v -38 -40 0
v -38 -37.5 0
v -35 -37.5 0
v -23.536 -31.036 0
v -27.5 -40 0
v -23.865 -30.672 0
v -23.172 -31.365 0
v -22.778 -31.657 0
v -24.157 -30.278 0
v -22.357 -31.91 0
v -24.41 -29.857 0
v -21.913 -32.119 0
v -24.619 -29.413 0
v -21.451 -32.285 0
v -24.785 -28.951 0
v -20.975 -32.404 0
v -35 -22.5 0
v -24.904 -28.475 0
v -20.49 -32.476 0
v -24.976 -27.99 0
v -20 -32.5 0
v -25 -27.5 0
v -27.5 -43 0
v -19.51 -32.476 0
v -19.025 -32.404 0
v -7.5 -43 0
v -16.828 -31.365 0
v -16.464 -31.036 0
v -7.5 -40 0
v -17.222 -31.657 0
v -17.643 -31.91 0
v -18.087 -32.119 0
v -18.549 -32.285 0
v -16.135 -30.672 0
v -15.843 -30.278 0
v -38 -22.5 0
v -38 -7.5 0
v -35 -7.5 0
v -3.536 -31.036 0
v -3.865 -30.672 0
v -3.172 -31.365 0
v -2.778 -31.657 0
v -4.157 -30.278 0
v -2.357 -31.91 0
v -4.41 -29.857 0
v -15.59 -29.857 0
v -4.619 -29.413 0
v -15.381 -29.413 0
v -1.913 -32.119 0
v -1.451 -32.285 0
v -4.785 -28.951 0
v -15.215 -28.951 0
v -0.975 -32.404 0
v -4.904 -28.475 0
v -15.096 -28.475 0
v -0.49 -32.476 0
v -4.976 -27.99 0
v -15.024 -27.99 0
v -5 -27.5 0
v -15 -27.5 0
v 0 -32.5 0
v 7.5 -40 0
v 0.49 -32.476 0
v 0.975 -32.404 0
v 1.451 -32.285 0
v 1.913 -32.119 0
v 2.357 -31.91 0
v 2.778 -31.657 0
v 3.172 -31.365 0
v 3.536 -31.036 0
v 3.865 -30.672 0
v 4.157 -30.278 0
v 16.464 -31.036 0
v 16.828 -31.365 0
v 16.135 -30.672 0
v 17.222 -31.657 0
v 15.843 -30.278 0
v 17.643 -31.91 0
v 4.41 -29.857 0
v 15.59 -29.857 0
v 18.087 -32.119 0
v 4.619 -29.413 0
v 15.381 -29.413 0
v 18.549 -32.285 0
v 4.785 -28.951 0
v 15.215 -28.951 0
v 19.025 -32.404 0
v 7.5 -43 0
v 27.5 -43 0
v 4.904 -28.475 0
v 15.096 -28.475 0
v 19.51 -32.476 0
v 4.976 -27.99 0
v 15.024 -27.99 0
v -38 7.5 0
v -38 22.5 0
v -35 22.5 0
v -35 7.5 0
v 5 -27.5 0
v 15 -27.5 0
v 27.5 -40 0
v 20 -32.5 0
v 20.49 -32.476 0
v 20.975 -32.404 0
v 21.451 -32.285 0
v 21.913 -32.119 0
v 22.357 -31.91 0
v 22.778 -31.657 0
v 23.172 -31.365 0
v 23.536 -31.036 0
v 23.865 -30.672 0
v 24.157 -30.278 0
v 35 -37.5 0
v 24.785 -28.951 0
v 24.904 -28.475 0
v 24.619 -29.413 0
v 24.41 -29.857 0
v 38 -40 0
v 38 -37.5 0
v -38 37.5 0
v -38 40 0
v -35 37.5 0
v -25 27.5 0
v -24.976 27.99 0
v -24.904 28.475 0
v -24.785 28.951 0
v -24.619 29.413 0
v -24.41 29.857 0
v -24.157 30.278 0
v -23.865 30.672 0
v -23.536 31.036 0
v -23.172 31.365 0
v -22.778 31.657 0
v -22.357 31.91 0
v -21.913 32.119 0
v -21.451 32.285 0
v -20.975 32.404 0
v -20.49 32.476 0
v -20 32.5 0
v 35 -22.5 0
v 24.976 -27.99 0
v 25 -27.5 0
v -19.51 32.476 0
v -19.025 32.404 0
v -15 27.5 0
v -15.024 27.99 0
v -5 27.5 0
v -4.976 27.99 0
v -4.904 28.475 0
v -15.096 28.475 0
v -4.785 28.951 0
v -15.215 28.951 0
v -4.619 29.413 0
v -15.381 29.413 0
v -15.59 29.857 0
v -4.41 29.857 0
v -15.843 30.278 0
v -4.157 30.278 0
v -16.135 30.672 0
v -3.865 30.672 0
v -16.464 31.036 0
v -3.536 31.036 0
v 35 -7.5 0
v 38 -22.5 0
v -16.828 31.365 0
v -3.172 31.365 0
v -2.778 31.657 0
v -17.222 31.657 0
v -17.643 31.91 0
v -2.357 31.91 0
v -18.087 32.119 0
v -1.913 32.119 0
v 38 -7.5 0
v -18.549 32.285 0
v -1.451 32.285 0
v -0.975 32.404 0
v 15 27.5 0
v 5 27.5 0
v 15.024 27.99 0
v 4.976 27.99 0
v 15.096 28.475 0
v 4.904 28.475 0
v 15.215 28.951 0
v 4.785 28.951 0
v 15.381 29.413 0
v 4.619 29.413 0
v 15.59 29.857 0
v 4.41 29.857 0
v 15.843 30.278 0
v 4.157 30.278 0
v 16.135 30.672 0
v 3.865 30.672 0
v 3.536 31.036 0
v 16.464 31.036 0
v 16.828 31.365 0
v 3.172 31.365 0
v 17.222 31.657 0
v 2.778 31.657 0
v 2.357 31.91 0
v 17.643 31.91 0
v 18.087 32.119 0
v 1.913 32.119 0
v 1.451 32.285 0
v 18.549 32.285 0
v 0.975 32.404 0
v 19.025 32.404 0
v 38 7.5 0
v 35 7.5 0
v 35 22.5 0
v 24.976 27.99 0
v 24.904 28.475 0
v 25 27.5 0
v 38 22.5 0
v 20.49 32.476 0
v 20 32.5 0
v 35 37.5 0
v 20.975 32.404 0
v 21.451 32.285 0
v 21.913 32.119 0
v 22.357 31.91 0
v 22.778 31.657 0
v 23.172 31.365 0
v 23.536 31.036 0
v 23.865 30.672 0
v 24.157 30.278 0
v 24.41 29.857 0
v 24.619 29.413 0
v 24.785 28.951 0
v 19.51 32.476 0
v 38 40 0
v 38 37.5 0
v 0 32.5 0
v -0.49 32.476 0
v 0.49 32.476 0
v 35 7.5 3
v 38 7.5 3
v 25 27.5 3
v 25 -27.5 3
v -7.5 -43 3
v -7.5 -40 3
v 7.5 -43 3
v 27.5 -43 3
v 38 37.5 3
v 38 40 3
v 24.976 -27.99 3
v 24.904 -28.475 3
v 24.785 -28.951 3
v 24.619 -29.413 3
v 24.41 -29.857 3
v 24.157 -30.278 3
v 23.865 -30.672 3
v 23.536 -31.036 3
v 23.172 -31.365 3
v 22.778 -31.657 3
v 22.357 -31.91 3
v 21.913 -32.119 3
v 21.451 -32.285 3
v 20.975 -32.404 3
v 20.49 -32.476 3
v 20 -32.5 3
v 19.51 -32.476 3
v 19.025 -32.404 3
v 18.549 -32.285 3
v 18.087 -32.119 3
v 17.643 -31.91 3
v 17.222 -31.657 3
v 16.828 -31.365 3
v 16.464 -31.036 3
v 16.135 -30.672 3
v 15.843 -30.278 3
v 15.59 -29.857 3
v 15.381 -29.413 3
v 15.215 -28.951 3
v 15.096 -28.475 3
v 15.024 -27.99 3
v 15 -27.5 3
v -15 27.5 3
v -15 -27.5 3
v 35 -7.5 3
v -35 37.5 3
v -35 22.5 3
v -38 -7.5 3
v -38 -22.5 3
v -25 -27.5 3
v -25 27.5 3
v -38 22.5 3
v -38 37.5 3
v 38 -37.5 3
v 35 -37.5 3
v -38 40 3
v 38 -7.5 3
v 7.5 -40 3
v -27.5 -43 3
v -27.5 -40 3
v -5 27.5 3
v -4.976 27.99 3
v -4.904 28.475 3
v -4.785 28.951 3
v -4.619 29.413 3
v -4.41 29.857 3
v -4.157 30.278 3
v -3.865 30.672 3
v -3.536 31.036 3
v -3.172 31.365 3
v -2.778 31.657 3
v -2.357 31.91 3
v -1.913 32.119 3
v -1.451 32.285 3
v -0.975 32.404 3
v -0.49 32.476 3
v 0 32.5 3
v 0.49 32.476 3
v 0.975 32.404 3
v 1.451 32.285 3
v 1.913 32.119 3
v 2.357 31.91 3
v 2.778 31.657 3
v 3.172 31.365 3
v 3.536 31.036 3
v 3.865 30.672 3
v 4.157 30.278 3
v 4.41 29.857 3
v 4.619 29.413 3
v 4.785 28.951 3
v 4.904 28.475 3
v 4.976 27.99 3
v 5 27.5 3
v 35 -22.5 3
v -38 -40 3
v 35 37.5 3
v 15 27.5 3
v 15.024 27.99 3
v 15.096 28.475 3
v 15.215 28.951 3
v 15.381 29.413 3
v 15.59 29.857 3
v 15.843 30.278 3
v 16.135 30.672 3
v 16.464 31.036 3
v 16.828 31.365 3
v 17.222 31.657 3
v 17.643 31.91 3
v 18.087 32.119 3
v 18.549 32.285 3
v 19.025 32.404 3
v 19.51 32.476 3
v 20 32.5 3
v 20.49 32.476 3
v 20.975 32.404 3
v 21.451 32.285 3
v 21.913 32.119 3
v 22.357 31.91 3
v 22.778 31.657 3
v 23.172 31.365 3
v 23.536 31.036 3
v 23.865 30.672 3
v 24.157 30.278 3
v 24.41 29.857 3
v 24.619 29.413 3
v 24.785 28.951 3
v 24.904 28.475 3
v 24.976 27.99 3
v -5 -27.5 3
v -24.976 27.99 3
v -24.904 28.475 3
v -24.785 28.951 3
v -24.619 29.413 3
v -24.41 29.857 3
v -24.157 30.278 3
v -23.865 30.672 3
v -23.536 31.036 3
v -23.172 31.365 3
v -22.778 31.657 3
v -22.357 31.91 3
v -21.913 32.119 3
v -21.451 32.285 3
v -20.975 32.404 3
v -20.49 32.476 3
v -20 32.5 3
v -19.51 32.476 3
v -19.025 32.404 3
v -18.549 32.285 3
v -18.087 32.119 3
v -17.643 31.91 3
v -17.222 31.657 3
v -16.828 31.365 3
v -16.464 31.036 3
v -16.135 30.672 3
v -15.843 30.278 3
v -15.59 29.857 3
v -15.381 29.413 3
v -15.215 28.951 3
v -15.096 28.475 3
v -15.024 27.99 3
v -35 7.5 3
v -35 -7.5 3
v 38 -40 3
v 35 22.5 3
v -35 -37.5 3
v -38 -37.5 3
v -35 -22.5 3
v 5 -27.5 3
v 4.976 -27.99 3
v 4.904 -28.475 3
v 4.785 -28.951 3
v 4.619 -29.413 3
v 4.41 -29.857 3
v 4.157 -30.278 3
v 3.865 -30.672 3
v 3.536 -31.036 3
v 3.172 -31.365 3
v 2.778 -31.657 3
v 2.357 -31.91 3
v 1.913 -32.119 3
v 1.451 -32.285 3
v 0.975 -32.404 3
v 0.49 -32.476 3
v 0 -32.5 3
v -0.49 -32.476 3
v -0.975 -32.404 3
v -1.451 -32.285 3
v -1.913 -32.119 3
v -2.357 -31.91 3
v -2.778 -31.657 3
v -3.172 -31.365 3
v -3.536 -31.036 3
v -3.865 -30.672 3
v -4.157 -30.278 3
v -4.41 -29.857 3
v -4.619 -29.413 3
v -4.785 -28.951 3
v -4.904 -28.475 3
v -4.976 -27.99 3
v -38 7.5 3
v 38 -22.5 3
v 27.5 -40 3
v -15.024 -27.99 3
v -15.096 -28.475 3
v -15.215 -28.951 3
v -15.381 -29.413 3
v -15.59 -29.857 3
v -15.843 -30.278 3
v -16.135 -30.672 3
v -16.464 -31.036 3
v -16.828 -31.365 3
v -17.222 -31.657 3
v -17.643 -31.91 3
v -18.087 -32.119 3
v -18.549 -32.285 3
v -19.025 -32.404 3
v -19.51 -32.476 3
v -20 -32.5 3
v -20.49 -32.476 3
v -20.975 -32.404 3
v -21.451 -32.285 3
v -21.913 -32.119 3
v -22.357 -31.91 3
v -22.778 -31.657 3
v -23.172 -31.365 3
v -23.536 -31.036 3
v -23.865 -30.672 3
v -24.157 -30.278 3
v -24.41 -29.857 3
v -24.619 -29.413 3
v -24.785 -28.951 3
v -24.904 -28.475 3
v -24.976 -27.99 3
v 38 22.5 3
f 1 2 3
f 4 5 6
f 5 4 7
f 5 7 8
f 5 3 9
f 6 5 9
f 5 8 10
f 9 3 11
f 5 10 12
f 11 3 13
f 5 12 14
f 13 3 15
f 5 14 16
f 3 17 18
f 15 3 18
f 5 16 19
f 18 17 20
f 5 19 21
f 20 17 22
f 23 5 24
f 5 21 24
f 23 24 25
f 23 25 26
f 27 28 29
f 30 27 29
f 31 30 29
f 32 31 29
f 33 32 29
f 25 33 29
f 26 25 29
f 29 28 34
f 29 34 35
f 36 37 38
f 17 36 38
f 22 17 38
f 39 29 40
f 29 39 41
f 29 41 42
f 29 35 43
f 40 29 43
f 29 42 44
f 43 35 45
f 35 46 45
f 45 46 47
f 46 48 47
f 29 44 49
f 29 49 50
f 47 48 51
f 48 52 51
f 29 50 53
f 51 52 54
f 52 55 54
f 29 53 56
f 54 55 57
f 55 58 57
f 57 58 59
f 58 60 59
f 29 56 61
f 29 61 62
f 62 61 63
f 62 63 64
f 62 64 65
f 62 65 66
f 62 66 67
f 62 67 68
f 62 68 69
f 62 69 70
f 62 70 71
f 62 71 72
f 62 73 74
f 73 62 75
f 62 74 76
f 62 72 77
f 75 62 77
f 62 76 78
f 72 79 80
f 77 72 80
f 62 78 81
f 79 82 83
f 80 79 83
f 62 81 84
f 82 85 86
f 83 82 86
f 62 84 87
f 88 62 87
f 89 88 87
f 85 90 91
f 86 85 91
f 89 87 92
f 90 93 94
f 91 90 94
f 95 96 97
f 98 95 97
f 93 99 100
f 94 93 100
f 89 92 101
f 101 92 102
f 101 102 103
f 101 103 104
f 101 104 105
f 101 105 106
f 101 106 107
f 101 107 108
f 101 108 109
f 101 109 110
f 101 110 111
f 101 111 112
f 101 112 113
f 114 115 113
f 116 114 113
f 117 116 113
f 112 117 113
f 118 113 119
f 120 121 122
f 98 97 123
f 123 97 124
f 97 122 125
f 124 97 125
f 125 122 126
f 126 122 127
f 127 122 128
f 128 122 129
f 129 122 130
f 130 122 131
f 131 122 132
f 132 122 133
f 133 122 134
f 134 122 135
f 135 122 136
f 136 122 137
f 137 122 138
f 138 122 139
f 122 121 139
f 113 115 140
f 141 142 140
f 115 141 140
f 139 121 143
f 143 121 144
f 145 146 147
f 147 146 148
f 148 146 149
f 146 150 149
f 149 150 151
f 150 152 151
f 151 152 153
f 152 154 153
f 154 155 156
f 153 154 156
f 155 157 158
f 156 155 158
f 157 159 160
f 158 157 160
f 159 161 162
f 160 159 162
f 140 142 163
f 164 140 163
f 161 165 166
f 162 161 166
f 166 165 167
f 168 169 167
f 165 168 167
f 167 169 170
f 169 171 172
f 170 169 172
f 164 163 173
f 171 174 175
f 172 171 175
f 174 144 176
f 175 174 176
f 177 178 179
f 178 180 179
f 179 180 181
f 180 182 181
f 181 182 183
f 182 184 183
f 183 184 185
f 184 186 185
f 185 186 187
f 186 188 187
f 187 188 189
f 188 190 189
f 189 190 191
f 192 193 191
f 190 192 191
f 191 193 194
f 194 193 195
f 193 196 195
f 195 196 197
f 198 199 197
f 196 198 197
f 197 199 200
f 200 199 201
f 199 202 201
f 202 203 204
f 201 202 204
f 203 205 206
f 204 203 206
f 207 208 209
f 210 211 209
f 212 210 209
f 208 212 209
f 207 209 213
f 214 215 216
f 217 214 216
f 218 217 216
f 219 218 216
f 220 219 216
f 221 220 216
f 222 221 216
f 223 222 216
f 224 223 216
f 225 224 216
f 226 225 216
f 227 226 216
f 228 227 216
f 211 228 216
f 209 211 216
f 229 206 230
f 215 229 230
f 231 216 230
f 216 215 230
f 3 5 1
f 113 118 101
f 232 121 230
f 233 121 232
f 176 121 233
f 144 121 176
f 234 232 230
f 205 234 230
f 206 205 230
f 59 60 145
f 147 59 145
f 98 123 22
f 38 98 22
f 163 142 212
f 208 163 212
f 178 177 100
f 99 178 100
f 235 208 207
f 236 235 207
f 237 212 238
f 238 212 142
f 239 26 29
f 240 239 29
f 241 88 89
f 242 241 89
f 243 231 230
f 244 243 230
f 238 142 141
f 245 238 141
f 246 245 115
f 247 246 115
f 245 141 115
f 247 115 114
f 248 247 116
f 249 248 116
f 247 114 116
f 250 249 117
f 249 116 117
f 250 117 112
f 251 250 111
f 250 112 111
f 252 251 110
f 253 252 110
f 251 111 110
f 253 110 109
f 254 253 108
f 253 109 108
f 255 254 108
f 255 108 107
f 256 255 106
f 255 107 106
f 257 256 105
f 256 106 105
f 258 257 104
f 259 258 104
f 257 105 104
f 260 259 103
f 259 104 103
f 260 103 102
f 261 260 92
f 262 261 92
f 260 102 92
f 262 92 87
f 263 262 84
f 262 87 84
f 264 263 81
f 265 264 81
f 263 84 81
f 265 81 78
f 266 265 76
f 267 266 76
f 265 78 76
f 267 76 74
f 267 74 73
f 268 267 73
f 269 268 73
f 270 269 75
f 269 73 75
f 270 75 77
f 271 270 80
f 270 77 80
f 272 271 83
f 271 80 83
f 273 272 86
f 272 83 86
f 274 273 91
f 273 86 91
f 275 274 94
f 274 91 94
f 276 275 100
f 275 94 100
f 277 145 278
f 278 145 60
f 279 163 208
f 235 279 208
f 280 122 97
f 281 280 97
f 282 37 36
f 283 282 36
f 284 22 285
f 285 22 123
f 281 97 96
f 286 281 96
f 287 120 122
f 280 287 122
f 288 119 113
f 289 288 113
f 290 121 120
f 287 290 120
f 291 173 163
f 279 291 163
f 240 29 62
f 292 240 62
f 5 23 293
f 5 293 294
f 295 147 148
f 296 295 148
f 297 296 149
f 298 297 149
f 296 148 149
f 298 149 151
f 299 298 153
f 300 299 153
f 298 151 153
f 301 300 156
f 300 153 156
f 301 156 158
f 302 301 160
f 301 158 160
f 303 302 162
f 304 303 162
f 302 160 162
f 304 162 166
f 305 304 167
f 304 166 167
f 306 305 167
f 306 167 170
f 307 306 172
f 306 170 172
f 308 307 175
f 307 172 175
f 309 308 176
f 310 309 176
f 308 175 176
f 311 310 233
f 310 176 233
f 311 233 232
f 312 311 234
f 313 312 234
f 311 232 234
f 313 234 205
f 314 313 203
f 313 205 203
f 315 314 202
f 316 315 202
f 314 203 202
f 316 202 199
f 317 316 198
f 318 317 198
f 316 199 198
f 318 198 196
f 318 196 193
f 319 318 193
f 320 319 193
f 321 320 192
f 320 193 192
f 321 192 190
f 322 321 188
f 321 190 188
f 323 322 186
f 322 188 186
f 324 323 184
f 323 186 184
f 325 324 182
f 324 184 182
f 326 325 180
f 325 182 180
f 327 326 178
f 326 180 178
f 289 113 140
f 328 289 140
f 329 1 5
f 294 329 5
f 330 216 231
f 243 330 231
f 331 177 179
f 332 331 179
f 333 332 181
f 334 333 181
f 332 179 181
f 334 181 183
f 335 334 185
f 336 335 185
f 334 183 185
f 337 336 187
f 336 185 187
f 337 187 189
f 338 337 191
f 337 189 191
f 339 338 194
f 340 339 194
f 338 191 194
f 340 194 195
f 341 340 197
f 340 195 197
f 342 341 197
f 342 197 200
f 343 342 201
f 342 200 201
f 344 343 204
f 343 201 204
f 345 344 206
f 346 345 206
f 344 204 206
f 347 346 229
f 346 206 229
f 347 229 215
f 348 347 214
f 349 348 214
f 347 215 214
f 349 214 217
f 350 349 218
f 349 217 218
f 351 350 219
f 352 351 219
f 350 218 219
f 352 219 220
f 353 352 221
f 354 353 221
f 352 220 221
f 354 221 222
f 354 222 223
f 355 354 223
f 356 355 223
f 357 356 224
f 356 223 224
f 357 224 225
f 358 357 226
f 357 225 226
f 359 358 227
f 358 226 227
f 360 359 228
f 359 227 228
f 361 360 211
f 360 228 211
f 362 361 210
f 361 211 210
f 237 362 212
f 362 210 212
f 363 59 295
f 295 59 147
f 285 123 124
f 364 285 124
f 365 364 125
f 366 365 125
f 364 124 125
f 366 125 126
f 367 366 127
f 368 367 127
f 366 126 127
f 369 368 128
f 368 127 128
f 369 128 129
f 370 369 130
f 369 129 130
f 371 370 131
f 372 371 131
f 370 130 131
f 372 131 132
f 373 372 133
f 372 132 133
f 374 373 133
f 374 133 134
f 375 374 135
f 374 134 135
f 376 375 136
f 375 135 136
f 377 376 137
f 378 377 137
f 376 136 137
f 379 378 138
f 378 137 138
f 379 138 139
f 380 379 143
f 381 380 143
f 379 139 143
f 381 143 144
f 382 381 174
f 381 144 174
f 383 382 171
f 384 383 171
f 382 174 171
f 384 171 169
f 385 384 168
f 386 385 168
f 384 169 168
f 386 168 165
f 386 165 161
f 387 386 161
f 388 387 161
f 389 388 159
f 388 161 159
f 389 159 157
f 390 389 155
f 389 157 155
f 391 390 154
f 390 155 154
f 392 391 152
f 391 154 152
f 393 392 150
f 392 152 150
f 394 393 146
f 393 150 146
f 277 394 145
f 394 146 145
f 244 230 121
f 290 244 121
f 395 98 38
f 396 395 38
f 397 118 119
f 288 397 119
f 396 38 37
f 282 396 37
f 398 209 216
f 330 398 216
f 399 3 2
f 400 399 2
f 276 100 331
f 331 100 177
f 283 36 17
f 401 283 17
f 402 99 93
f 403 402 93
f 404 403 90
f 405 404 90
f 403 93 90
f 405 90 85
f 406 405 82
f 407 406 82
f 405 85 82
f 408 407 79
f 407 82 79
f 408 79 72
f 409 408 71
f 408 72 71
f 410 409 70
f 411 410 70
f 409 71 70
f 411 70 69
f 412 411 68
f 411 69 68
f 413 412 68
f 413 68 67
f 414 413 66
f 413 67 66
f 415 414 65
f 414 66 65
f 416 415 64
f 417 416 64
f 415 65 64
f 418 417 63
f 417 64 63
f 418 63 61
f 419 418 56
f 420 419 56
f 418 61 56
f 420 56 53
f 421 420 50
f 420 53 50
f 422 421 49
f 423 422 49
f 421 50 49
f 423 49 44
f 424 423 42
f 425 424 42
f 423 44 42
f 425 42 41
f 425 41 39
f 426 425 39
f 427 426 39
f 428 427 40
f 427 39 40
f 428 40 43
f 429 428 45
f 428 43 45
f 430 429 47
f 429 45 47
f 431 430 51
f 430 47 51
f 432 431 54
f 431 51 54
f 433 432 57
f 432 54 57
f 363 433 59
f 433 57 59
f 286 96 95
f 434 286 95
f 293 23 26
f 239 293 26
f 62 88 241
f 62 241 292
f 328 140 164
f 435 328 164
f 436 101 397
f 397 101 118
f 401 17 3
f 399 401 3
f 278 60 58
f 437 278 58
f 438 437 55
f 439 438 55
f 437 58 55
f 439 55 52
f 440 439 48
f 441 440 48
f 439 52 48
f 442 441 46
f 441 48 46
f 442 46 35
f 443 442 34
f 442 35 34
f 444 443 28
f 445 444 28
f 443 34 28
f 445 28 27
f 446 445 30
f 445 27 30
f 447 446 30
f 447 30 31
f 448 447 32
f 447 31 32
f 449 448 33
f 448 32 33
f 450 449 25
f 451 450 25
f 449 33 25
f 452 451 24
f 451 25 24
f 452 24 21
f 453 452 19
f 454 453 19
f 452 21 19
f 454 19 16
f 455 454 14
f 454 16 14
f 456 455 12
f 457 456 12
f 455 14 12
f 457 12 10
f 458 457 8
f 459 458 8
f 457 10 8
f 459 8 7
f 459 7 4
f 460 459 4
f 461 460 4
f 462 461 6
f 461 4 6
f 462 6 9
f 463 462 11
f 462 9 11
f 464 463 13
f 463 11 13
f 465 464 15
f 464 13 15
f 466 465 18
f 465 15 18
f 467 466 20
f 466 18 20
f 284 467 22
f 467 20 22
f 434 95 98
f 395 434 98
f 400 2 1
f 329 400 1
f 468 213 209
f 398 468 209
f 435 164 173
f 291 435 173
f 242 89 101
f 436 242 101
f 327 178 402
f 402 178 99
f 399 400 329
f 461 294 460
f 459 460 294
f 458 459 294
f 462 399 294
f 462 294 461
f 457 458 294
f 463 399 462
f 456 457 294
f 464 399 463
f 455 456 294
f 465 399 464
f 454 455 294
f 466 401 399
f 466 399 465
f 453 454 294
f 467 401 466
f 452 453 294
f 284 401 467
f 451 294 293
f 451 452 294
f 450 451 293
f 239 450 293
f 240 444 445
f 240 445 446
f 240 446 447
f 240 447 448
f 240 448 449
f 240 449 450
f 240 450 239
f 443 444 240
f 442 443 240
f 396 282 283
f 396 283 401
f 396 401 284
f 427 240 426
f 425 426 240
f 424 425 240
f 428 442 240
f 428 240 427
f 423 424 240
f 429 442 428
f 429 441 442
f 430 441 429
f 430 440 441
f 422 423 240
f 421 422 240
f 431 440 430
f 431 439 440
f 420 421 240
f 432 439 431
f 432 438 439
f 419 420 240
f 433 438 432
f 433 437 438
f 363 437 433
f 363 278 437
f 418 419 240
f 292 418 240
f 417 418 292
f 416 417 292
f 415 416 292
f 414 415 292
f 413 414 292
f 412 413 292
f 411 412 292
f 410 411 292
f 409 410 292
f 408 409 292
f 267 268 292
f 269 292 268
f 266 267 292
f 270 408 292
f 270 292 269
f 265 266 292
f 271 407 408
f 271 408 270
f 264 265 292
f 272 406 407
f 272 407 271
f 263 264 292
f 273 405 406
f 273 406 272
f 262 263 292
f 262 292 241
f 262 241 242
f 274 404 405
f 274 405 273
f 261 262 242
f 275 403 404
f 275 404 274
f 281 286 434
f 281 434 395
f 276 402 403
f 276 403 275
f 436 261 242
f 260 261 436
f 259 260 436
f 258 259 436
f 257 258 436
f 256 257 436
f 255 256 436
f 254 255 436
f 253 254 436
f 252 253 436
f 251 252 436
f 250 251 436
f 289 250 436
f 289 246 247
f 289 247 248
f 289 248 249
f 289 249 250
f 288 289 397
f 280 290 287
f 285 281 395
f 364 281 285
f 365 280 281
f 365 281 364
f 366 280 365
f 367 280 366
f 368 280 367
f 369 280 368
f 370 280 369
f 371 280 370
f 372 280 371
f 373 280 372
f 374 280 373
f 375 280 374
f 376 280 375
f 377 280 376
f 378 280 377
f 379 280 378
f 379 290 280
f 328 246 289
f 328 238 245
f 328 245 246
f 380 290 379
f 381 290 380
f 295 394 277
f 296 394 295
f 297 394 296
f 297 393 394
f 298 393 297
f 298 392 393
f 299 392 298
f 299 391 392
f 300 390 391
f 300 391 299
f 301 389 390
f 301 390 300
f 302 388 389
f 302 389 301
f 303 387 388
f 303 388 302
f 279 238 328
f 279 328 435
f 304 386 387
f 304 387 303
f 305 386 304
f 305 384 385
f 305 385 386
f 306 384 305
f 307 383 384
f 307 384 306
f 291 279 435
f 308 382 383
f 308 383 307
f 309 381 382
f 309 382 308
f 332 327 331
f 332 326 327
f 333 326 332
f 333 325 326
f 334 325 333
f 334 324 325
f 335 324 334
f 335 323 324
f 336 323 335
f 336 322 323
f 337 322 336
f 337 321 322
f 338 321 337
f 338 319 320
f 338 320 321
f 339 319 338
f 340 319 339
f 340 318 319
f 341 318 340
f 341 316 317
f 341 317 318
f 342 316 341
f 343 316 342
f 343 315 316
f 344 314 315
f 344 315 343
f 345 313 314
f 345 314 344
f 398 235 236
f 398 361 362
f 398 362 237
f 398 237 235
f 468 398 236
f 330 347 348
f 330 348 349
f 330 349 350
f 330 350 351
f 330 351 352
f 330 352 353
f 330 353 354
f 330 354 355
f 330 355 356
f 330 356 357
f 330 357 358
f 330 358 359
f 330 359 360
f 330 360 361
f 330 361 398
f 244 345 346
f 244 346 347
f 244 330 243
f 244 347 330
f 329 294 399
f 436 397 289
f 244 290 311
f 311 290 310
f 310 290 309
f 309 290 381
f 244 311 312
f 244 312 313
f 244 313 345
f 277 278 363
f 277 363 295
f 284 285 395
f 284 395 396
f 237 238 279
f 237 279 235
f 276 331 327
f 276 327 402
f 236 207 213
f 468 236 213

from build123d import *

# Parameters (mm, degrees)
SKETCH1_W           = 20
SKETCH1_H           = 3
BOSS_EXTRUDE1_DEPTH = 3


with BuildPart() as part:
    # Sketch1 → Boss-Extrude1 (new body)
    # profile 1 of 3: a face of its own
    with BuildSketch(Plane.XY):
        Polygon((35, 40), (-35, 40), (-38, 40), (-38, 37.5), (-35, 37.5), (-35, 22.5), (-38, 22.5), (-38, 7.5), (-35, 7.5), (-35, -7.5), (-38, -7.5), (-38, -22.5), (-35, -22.5), (-35, -37.5), (-38, -37.5), (-38, -40), (-27.5, -40), (-7.5, -40), (7.5, -40), (27.5, -40), (38, -40), (38, -37.5), (35, -37.5), (35, -22.5), (38, -22.5), (38, -7.5), (35, -7.5), (35, 7.5), (38, 7.5), (38, 22.5), (35, 22.5), (35, 37.5), (38, 37.5), (38, 40), align=None)
        with BuildLine():
            Line((-15, 27.5), (-15, -27.5))
            ThreePointArc((-15, -27.5), (-20, -32.5), (-25, -27.5))
            Line((-25, -27.5), (-25, 27.5))
            ThreePointArc((-25, 27.5), (-20, 32.5), (-15, 27.5))
        make_face(mode=Mode.SUBTRACT)
        with BuildLine():
            ThreePointArc((5, -27.5), (0, -32.5), (-5, -27.5))
            Line((-5, -27.5), (-5, 27.5))
            ThreePointArc((-5, 27.5), (0, 32.5), (5, 27.5))
            Line((5, 27.5), (5, -27.5))
        make_face(mode=Mode.SUBTRACT)
        with BuildLine():
            ThreePointArc((25, -27.5), (20, -32.5), (15, -27.5))
            Line((15, -27.5), (15, 27.5))
            ThreePointArc((15, 27.5), (20, 32.5), (25, 27.5))
            Line((25, 27.5), (25, -27.5))
        make_face(mode=Mode.SUBTRACT)
    # profile 2 of 3: a face of its own
    with BuildSketch(Plane.XY):
        with Locations((17.5, -41.5)):
            Rectangle(SKETCH1_W, SKETCH1_H)
    # profile 3 of 3: a face of its own
    with BuildSketch(Plane.XY):
        with Locations((-17.5, -41.5)):
            Rectangle(SKETCH1_W, SKETCH1_H)
    extrude(amount=BOSS_EXTRUDE1_DEPTH)


solid = part.part
